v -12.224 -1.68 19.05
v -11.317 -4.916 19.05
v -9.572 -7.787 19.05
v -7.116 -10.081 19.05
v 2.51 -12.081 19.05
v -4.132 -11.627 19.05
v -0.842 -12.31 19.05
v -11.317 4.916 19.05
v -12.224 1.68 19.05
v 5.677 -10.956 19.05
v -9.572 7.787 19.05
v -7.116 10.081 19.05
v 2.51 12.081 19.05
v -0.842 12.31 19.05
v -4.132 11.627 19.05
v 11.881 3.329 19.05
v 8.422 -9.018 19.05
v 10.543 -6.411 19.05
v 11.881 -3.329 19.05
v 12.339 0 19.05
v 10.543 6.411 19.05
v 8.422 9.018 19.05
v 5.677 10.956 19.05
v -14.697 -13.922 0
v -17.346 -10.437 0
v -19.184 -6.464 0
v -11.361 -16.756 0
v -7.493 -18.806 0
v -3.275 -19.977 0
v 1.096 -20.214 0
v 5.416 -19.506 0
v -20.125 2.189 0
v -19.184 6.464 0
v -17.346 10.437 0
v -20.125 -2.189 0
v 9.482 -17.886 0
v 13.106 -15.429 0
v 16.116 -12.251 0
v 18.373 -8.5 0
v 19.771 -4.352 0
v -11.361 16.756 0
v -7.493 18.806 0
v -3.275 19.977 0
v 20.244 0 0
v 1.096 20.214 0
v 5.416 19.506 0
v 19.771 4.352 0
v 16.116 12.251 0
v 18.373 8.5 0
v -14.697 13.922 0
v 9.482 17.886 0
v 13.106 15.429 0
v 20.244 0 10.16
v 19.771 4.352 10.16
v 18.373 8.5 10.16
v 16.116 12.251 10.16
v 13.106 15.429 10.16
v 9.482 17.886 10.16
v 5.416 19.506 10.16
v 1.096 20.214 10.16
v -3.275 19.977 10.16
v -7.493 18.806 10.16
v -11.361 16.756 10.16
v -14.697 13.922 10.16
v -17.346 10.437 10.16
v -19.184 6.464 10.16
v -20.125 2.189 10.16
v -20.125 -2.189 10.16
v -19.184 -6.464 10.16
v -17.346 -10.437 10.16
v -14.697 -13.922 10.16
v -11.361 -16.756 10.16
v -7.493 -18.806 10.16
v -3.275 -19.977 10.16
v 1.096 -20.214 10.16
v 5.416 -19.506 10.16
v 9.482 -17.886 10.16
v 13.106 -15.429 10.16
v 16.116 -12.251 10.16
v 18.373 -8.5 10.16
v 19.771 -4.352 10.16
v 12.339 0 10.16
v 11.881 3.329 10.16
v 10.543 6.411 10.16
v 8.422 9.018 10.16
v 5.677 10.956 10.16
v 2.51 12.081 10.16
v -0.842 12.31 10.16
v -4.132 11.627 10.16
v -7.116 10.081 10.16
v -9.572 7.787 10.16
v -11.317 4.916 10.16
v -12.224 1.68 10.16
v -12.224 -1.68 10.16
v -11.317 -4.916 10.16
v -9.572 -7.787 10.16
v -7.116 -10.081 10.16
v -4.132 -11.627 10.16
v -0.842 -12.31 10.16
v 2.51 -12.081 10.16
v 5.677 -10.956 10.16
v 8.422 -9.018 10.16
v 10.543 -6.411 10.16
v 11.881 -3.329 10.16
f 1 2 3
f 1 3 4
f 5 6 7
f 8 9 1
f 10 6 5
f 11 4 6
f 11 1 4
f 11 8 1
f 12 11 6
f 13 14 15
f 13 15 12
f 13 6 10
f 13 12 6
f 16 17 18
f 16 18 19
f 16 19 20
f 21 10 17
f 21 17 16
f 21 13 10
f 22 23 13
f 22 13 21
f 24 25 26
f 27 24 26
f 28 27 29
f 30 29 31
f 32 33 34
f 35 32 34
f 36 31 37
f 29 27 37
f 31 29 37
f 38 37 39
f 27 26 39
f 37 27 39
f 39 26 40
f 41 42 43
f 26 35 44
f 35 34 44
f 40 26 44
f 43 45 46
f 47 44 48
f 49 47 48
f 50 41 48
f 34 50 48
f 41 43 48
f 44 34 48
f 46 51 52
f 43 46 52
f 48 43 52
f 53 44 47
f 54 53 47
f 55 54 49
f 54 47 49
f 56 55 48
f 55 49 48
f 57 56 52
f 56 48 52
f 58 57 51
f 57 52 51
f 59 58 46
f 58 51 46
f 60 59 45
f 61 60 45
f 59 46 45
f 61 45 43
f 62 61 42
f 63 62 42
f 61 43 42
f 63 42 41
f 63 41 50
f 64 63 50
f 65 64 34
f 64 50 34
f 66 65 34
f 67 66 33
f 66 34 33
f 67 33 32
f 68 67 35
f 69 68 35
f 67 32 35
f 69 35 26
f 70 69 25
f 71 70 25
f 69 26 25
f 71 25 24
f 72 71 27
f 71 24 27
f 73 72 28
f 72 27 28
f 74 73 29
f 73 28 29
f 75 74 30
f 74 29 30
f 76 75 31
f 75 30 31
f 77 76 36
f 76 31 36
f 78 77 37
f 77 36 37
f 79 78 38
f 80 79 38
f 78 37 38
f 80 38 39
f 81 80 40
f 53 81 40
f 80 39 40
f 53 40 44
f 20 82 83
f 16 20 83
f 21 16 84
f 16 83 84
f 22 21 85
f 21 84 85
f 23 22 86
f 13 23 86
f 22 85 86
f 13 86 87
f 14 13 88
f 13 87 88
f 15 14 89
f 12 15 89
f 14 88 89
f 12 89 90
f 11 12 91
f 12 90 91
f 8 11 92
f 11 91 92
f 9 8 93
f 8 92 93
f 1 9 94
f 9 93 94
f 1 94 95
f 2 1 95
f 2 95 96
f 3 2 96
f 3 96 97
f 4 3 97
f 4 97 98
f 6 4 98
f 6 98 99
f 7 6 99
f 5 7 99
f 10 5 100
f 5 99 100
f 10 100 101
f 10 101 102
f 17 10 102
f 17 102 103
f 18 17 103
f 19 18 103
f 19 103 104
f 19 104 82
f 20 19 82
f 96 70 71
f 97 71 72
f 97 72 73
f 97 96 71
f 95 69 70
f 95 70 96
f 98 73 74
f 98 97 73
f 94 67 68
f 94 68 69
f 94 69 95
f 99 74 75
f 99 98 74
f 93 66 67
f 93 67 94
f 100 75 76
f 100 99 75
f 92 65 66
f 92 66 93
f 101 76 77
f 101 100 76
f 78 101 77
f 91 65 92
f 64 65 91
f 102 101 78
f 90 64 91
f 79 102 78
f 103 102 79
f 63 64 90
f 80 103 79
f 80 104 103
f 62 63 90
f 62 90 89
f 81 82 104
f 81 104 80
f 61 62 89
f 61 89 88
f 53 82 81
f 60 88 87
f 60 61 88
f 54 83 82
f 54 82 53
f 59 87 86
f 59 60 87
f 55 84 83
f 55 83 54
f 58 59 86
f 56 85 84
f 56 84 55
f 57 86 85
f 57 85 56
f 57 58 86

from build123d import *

# Parameters (mm, degrees)
F0_R      = 20.2439763863
F1_DEPTH  = 10.16
F2_R      = 12.3390116376
F3_DEPTH  = 8.89
F5_DEPTH  = 0.254
F6_DEPTH  = 0.254
F7_DEPTH  = 2.286
F8_DEPTH  = 2.286
F10_DEPTH = 25.4
F11_DEPTH = 50.8
F12_DEPTH = 1.27
F13_DEPTH = 1.27
F14_DEPTH = 25.4


with BuildPart() as f1:
    # F0 (on Top) → F1 (new body)
    with BuildSketch(Plane.XY):
        Circle(F0_R)
    extrude(amount=F1_DEPTH)

    # F2 (on face) → F3 (join)
    with BuildSketch(Plane.XY.offset(10.16)):
        Circle(F2_R)
    extrude(amount=F3_DEPTH)

    # F4 (on Front) → F5 (join)
    with BuildSketch(Plane.XZ):
        with BuildLine():
            add(Edge.make_bspline(
                [(-12.1147008613, 18.9316812903), (-12.5825885387, 39.643614737), (-14.1043760911, 180.4872847527), (-20.1423116849, 215.1594423433), (-16.5980636671, 214.2285434237), (-12.8136342596, 217.1071550637), (-13.8994905387, 225.3991797656), (-17.690195851, 229.7737918888), (-21.3235962144, 228.5443351063), (-21.72468447, 231.1706865689), (-23.0745608098, 250.4649690024), (-22.9518555989, 256.8313726894), (-25.9612755155, 279.5145026457), (-19.7421258922, 272.3476049684), (-8.8885956952, 268.998501799), (6.6271937698, 261.4946225406), (12.2027765589, 256.1934321206), (17.5689411606, 248.9539384021), (19.5820695948, 242.6412768865), (21.7285943019, 235.2163703421), (21.0795757322, 226.6989574981), (17.1180518063, 124.7114584437), (15.2094878956, 77.70771609), (11.6083548837, 18.1667354361), (12.5199184163, 13.1739974773), (7.8980496645, 11.3722942506), (0.3726356815, 13.3748423837), (-11.8699226938, 12.3427906017), (-12.0266797417, 15.035259866), (-12.1147008613, 18.9316812903)],
                knots=[0, 0, 0, 0, 0.1257254435, 0.1801466998, 0.1919036578, 0.2112403794, 0.2389108592, 0.261334308, 0.2775826335, 0.2907551098, 0.3325149493, 0.3636705446, 0.4039783899, 0.4240659342, 0.4586729556, 0.4992031799, 0.5266476396, 0.5552636706, 0.5809163826, 0.6063516787, 0.6344015668, 0.7303572224, 0.8074506533, 0.8789177389, 0.897509656, 0.9162026247, 0.9446563322, 0.976347968, 1, 1, 1, 1], degree=3))
        make_face()
    extrude(amount=F5_DEPTH)

    # F6 (add): a face of the model
    f6_faces = [f1.faces().sort_by_distance(p)[0] for p in [
        (0.2349858377, 0, 153.5959306446),
    ]]
    extrude(f6_faces, amount=F6_DEPTH)

    # F7 (add): a face of the model
    f7_faces = [f1.faces().sort_by_distance(p)[0] for p in [
        (0.2349858377, 0.254, 153.5959306446),
    ]]
    extrude(f7_faces, amount=F7_DEPTH)

    # F8 (add): a face of the model
    f8_faces = [f1.faces().sort_by_distance(p)[0] for p in [
        (0.2349858377, -0.254, 153.5959306446),
    ]]
    extrude(f8_faces, amount=F8_DEPTH)

    # F9 (on Front) → F10 (join)
    with BuildSketch(Plane.XZ):
        Polygon((-28.4392070025, 277.075022459), (5.8726719581, 261.9545459747), (-7.6194559224, 282.5416624546), align=None)
    extrude(amount=F10_DEPTH)

    # F11 (cut): a face of the model
    f11_faces = [f1.faces().sort_by_distance(p)[0] for p in [
        (-10.061996989, -25.4, 273.8570769628),
    ]]
    extrude(f11_faces, amount=-F11_DEPTH, mode=Mode.SUBTRACT)

    # F12 (cut): a face of the model
    f12_faces = [f1.faces().sort_by_distance(p)[0] for p in [
        (0.248434517, -2.54, 153.5481680876),
    ]]
    extrude(f12_faces, amount=-F12_DEPTH, mode=Mode.SUBTRACT)

    # F13 (cut): a face of the model
    f13_faces = [f1.faces().sort_by_distance(p)[0] for p in [
        (0.248434517, 2.54, 153.5481680876),
    ]]
    extrude(f13_faces, amount=-F13_DEPTH, mode=Mode.SUBTRACT)

    # F14 (cut): a face of the model
    f14_faces = [f1.faces().sort_by_distance(p)[0] for p in [
        (0.248434517, -1.27, 153.5481680876),
    ]]
    extrude(f14_faces, amount=-F14_DEPTH, mode=Mode.SUBTRACT)


solid = f1.part
